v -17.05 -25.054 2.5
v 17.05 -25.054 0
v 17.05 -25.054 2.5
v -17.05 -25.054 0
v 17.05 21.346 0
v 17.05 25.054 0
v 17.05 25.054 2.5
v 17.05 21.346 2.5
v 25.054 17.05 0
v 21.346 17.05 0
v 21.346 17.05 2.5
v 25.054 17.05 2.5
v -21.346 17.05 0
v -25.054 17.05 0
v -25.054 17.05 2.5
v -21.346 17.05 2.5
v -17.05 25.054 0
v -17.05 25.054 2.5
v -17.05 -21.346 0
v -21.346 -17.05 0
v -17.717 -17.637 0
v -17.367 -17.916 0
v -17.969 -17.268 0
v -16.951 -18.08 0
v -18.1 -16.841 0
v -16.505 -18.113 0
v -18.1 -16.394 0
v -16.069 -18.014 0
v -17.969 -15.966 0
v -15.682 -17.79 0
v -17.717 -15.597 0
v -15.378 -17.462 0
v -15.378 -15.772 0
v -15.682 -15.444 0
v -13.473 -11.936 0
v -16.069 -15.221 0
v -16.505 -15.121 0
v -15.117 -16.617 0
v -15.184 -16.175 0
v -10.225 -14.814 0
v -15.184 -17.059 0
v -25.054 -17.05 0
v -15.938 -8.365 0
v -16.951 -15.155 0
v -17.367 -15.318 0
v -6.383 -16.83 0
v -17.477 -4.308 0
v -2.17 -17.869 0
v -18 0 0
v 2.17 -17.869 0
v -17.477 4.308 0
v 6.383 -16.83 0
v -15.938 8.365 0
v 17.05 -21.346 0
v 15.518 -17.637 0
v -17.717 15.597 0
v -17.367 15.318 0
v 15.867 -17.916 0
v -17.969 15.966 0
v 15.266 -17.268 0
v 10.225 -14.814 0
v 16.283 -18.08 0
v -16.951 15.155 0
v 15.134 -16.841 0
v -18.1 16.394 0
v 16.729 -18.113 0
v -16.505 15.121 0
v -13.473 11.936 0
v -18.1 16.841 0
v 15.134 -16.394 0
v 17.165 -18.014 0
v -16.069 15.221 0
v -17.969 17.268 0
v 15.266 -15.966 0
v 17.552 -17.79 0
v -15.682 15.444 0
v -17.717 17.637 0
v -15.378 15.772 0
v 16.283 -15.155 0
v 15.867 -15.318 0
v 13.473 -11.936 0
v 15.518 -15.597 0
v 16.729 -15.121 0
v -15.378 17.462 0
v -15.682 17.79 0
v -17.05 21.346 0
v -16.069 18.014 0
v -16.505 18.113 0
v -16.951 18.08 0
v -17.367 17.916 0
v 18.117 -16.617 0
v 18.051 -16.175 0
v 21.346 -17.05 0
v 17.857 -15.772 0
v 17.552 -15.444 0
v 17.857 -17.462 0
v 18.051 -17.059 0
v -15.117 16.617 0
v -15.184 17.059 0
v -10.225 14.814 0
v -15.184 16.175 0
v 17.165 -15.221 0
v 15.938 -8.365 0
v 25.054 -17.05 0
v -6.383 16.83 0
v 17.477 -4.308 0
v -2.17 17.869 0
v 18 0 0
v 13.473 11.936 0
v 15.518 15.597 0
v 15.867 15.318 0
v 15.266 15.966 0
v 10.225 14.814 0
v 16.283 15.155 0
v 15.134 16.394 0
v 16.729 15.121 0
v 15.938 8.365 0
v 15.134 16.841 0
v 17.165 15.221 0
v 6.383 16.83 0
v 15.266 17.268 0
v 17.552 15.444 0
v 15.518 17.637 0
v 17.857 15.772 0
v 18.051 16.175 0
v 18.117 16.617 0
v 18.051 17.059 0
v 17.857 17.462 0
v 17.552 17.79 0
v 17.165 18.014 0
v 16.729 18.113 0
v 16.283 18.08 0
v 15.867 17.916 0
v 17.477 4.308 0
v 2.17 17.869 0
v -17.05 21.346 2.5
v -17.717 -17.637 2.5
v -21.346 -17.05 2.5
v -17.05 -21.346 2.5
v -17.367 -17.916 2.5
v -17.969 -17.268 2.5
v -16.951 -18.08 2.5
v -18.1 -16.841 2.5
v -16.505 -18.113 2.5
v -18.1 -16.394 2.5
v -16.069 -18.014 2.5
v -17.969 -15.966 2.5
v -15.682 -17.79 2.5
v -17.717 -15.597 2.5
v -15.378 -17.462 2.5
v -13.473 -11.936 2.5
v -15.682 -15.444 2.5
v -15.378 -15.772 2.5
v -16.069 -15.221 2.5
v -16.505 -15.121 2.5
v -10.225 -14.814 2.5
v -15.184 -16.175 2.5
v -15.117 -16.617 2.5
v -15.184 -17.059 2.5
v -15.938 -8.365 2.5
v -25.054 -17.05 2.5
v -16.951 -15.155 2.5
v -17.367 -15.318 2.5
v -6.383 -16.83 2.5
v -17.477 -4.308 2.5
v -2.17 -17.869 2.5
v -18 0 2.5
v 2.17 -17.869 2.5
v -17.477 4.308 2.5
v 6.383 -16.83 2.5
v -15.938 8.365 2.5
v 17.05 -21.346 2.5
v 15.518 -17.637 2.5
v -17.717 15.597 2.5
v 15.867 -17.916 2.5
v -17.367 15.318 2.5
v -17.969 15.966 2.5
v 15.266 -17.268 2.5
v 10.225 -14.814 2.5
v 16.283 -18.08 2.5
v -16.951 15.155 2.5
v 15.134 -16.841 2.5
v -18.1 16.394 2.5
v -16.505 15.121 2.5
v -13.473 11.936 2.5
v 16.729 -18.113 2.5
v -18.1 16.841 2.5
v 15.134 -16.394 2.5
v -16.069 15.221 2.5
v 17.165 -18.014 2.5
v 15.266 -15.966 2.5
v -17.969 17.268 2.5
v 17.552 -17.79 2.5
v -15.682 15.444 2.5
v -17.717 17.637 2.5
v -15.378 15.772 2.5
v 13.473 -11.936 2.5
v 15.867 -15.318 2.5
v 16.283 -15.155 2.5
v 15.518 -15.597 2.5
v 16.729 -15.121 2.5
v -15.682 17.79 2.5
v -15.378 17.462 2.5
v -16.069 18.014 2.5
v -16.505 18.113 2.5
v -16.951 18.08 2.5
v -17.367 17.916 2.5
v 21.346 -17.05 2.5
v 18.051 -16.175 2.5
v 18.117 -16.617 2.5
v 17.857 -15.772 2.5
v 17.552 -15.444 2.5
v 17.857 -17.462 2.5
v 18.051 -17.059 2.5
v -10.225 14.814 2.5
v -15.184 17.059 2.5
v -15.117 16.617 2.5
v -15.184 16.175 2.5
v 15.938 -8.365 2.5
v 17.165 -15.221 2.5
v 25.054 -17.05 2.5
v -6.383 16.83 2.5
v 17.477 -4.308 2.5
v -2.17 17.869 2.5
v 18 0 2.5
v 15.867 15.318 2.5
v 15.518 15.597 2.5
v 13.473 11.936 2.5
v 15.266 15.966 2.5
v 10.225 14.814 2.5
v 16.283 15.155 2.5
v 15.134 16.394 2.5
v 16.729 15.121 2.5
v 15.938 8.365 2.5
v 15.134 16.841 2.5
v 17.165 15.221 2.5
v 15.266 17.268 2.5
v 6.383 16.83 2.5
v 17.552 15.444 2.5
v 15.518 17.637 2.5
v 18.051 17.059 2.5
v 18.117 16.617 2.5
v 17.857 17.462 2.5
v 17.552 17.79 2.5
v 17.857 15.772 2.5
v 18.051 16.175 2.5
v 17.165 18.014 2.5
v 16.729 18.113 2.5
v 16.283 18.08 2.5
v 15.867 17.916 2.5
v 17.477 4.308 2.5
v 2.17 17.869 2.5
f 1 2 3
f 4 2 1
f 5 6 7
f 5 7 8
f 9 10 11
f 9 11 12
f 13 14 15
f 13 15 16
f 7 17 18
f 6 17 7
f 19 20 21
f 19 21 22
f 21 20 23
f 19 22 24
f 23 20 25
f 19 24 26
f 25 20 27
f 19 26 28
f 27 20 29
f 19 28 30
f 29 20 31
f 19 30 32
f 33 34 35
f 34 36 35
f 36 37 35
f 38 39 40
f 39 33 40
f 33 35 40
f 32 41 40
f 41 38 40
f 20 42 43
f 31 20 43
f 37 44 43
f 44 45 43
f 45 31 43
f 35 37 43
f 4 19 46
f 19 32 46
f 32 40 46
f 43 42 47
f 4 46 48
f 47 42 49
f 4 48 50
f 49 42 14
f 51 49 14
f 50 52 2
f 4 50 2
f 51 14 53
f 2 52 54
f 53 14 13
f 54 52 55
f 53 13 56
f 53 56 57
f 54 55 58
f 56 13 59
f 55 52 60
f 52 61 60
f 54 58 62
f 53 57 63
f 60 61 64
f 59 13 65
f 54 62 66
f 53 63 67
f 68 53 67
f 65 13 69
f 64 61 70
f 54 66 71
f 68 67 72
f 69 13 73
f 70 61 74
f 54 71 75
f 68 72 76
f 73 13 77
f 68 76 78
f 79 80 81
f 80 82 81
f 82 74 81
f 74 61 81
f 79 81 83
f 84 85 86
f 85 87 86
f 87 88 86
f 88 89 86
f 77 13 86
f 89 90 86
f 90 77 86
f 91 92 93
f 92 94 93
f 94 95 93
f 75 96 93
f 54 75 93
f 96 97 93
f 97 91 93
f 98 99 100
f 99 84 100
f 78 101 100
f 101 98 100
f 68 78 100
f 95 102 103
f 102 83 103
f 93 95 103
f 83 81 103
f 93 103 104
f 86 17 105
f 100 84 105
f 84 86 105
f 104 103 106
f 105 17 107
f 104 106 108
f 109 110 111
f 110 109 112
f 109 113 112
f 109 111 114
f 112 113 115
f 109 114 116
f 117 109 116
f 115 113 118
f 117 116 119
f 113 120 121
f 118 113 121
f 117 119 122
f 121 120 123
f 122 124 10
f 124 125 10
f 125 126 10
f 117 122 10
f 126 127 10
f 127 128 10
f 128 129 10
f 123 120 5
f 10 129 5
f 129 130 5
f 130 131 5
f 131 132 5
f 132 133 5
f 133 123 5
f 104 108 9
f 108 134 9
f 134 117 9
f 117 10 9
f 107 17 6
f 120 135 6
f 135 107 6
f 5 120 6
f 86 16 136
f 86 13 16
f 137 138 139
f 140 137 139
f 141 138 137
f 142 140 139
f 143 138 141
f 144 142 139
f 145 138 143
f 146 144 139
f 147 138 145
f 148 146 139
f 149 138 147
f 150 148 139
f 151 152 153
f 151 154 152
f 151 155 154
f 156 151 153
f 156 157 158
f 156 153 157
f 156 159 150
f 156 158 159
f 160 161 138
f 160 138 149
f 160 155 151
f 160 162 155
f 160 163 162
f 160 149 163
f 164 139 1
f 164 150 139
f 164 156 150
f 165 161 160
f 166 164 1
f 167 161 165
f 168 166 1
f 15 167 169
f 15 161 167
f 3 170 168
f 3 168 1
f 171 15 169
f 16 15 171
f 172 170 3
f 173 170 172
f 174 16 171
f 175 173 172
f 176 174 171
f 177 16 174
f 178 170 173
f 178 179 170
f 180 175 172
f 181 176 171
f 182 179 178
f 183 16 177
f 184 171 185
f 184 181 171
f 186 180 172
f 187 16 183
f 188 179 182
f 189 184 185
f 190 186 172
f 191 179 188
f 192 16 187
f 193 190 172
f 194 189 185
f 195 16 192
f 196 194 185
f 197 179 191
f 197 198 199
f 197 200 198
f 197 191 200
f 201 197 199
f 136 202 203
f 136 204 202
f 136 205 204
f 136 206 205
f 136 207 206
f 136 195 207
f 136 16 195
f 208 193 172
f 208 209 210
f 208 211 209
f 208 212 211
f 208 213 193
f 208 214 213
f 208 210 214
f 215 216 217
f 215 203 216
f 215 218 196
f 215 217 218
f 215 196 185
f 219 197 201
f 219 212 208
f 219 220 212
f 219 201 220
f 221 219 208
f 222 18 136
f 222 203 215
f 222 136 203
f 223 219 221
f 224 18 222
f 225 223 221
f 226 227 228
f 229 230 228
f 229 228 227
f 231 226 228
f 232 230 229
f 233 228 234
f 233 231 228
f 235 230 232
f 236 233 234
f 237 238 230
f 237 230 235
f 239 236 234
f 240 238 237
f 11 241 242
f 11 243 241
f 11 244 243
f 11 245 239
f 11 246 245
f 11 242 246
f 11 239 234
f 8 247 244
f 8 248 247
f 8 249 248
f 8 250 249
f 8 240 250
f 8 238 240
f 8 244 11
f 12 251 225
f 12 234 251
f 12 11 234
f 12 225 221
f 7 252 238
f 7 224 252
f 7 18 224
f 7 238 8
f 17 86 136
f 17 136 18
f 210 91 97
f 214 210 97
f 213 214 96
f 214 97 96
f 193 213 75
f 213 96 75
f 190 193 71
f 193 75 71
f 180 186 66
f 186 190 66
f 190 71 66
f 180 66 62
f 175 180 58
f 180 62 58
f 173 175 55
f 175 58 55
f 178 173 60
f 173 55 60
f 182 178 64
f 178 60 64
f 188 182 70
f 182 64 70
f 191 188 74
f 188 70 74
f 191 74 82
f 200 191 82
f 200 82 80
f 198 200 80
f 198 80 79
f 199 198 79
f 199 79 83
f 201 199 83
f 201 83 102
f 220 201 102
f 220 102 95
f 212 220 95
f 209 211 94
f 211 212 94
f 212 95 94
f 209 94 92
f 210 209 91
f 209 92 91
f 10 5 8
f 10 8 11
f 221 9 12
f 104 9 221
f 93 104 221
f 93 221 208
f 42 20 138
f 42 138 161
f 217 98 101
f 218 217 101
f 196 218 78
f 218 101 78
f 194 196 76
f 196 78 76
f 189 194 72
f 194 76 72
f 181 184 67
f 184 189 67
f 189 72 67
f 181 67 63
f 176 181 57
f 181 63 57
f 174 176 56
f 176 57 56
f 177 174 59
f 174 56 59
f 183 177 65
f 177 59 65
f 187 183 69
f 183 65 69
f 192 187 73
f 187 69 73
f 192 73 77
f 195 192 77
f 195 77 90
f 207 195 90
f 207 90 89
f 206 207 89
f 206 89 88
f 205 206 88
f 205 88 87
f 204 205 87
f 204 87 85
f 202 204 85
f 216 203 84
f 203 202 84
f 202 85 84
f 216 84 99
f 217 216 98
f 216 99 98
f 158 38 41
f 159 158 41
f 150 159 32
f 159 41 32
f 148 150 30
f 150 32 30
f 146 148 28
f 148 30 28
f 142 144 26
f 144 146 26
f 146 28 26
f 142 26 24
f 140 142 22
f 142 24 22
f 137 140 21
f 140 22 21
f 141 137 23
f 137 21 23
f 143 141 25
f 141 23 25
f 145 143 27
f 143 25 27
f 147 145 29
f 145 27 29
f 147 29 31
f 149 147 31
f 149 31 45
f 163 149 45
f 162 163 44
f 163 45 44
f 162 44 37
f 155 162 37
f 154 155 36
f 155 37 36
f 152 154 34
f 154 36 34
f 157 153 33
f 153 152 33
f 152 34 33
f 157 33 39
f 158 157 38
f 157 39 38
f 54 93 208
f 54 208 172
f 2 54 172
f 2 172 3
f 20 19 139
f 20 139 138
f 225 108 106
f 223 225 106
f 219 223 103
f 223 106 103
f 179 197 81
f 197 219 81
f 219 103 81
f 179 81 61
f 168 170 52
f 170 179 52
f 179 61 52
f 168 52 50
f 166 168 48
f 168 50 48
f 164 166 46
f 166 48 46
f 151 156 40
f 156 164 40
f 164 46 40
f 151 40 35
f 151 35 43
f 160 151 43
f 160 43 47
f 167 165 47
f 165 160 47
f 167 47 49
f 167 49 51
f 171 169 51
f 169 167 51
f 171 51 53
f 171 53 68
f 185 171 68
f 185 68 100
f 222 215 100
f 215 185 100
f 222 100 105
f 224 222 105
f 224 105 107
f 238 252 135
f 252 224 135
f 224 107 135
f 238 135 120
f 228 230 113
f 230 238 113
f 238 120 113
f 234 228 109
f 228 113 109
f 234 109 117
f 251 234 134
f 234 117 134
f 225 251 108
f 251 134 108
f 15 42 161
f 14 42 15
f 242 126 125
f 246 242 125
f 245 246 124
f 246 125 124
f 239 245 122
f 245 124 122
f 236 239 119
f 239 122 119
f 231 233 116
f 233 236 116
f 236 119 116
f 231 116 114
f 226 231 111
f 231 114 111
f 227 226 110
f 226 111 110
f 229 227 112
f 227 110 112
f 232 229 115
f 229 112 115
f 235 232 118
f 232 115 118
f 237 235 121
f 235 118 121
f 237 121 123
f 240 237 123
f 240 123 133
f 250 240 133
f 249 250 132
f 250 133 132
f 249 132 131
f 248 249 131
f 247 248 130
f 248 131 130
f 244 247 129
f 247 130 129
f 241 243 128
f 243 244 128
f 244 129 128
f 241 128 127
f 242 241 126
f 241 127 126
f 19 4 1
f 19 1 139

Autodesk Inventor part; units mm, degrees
ref_plane "YZ Plane" through (0, 0, 0) normal (1, 0, 0) x (0, 1, 0)
ref_plane "XZ Plane" through (0, 0, 0) normal (0, 1, 0) x (-1, 0, 0)
ref_plane "XY Plane" through (0, 0, 0) normal (0, 0, 1) x (1, 0, 0)
sketch "Skizze1" plane through (0, 0, 0) normal (0, 0, 1) x (1, 0, 0)
  line L0 (-37.707, 0) -> (50.8634, 0) construction
  line L1 (0, -35.4687) -> (0, 37.4335) construction
  line L2 (0, 0) -> (27.0189, 27.0189) construction
  line L3 (0, 0) -> (38.2105, 0) construction
  line L4 (0, 24.9041) -> (16.9, 24.9041)
  line L5 (16.9, 24.9041) -> (16.9, 21.2841)
  line L6 (16.9, 21.2841) -> (19.092, 19.092)
  line L7 (24.9041, 0) -> (24.9041, 16.9)
  line L8 (24.9041, 16.9) -> (21.2841, 16.9)
  line L9 (21.2841, 16.9) -> (19.092, 19.092)
  line L10 (0, 24.9041) -> (-16.9, 24.9041)
  line L11 (-16.9, 24.9041) -> (-16.9, 21.2841)
  line L12 (-16.9, 21.2841) -> (-19.092, 19.092)
  line L13 (-24.9041, 0) -> (-24.9041, 16.9)
  line L14 (-24.9041, 16.9) -> (-21.2841, 16.9)
  line L15 (-21.2841, 16.9) -> (-19.092, 19.092)
  line L16 (0, -24.9041) -> (16.9, -24.9041)
  line L17 (16.9, -24.9041) -> (16.9, -21.2841)
  line L18 (16.9, -21.2841) -> (19.092, -19.092)
  line L19 (24.9041, 0) -> (24.9041, -16.9)
  line L20 (24.9041, -16.9) -> (21.2841, -16.9)
  line L21 (21.2841, -16.9) -> (19.092, -19.092)
  line L22 (0, -24.9041) -> (-16.9, -24.9041)
  line L23 (-16.9, -24.9041) -> (-16.9, -21.2841)
  line L24 (-16.9, -21.2841) -> (-19.092, -19.092)
  line L25 (-24.9041, 0) -> (-24.9041, -16.9)
  line L26 (-24.9041, -16.9) -> (-21.2841, -16.9)
  line L27 (-21.2841, -16.9) -> (-19.092, -19.092)
  circle A0 centre (0, 0) radius 18
  circle A1 centre (-16.6172, 16.6172) radius 1.5
  line L28 (-16.6172, 16.6172) -> (16.6172, 16.6172) construction
  line L29 (16.6172, 16.6172) -> (16.6172, -16.6172) construction
  line L30 (16.6172, -16.6172) -> (-16.6172, -16.6172) construction
  line L31 (-16.6172, -16.6172) -> (-16.6172, 16.6172) construction
  circle A2 centre (16.6172, 16.6172) radius 1.5
  circle A3 centre (-16.6172, -16.6172) radius 1.5
  circle A4 centre (16.6172, -16.6172) radius 1.5
  line L32 (-17.05, 25.0541) -> (0, 25.0541)
  line L33 (0, 25.0541) -> (17.05, 25.0541)
  line L34 (17.05, 25.0541) -> (17.05, 21.3462)
  line L35 (17.05, 21.3462) -> (19.1981, 19.1981)
  line L36 (19.1981, 19.1981) -> (21.3462, 17.05)
  line L37 (21.3462, 17.05) -> (25.0541, 17.05)
  line L38 (25.0541, 17.05) -> (25.0541, 0)
  line L39 (25.0541, 0) -> (25.0541, -17.05)
  line L40 (25.0541, -17.05) -> (21.3462, -17.05)
  line L41 (21.3462, -17.05) -> (19.1981, -19.1981)
  line L42 (19.1981, -19.1981) -> (17.05, -21.3462)
  line L43 (17.05, -21.3462) -> (17.05, -25.0541)
  line L44 (17.05, -25.0541) -> (0, -25.0541)
  line L45 (0, -25.0541) -> (-17.05, -25.0541)
  line L46 (-17.05, -25.0541) -> (-17.05, -21.3462)
  line L47 (-17.05, -21.3462) -> (-19.1981, -19.1981)
  line L48 (-19.1981, -19.1981) -> (-21.3462, -17.05)
  line L49 (-21.3462, -17.05) -> (-25.0541, -17.05)
  line L50 (-25.0541, -17.05) -> (-25.0541, 0)
  line L51 (-25.0541, 0) -> (-25.0541, 17.05)
  line L52 (-25.0541, 17.05) -> (-21.3462, 17.05)
  line L53 (-21.3462, 17.05) -> (-19.1981, 19.1981)
  line L54 (-19.1981, 19.1981) -> (-17.05, 21.3462)
  line L55 (-17.05, 21.3462) -> (-17.05, 25.0541)
  dimension "d0" = 45
  dimension "d1" = 16.9
  dimension "d2" = 3.62
  dimension "d3" = 3.1
  dimension "d4" = 36
  dimension "d7" = 3
  dimension "d8" = 3
  dimension "d9" = 3
  dimension "d10" = 3
  dimension "d11" = 3.5
  dimension "d12" = 0.15
extrude "Extrusion1" add sketch "Skizze1" along normal blind 2.5 contours L4 L5 L6 L9 L8 L7 L19 L20 L21 L18 L17 L16 L22 L23 L24 L27 L26 L25 L13 L14 L15 L12 L11 L10 | L32 L33 L34 L35 L36 L37 L38 L39 L40 L41 L42 L43 L44 L45 L46 L47 L48 L49 L50 L51 L52 L53 L54 L55
equation "\"d8\" = d7"
equation "\"d9\" = d7"
equation "\"d10\" = d7"
properties part number "LC_lens_holder_outer"
